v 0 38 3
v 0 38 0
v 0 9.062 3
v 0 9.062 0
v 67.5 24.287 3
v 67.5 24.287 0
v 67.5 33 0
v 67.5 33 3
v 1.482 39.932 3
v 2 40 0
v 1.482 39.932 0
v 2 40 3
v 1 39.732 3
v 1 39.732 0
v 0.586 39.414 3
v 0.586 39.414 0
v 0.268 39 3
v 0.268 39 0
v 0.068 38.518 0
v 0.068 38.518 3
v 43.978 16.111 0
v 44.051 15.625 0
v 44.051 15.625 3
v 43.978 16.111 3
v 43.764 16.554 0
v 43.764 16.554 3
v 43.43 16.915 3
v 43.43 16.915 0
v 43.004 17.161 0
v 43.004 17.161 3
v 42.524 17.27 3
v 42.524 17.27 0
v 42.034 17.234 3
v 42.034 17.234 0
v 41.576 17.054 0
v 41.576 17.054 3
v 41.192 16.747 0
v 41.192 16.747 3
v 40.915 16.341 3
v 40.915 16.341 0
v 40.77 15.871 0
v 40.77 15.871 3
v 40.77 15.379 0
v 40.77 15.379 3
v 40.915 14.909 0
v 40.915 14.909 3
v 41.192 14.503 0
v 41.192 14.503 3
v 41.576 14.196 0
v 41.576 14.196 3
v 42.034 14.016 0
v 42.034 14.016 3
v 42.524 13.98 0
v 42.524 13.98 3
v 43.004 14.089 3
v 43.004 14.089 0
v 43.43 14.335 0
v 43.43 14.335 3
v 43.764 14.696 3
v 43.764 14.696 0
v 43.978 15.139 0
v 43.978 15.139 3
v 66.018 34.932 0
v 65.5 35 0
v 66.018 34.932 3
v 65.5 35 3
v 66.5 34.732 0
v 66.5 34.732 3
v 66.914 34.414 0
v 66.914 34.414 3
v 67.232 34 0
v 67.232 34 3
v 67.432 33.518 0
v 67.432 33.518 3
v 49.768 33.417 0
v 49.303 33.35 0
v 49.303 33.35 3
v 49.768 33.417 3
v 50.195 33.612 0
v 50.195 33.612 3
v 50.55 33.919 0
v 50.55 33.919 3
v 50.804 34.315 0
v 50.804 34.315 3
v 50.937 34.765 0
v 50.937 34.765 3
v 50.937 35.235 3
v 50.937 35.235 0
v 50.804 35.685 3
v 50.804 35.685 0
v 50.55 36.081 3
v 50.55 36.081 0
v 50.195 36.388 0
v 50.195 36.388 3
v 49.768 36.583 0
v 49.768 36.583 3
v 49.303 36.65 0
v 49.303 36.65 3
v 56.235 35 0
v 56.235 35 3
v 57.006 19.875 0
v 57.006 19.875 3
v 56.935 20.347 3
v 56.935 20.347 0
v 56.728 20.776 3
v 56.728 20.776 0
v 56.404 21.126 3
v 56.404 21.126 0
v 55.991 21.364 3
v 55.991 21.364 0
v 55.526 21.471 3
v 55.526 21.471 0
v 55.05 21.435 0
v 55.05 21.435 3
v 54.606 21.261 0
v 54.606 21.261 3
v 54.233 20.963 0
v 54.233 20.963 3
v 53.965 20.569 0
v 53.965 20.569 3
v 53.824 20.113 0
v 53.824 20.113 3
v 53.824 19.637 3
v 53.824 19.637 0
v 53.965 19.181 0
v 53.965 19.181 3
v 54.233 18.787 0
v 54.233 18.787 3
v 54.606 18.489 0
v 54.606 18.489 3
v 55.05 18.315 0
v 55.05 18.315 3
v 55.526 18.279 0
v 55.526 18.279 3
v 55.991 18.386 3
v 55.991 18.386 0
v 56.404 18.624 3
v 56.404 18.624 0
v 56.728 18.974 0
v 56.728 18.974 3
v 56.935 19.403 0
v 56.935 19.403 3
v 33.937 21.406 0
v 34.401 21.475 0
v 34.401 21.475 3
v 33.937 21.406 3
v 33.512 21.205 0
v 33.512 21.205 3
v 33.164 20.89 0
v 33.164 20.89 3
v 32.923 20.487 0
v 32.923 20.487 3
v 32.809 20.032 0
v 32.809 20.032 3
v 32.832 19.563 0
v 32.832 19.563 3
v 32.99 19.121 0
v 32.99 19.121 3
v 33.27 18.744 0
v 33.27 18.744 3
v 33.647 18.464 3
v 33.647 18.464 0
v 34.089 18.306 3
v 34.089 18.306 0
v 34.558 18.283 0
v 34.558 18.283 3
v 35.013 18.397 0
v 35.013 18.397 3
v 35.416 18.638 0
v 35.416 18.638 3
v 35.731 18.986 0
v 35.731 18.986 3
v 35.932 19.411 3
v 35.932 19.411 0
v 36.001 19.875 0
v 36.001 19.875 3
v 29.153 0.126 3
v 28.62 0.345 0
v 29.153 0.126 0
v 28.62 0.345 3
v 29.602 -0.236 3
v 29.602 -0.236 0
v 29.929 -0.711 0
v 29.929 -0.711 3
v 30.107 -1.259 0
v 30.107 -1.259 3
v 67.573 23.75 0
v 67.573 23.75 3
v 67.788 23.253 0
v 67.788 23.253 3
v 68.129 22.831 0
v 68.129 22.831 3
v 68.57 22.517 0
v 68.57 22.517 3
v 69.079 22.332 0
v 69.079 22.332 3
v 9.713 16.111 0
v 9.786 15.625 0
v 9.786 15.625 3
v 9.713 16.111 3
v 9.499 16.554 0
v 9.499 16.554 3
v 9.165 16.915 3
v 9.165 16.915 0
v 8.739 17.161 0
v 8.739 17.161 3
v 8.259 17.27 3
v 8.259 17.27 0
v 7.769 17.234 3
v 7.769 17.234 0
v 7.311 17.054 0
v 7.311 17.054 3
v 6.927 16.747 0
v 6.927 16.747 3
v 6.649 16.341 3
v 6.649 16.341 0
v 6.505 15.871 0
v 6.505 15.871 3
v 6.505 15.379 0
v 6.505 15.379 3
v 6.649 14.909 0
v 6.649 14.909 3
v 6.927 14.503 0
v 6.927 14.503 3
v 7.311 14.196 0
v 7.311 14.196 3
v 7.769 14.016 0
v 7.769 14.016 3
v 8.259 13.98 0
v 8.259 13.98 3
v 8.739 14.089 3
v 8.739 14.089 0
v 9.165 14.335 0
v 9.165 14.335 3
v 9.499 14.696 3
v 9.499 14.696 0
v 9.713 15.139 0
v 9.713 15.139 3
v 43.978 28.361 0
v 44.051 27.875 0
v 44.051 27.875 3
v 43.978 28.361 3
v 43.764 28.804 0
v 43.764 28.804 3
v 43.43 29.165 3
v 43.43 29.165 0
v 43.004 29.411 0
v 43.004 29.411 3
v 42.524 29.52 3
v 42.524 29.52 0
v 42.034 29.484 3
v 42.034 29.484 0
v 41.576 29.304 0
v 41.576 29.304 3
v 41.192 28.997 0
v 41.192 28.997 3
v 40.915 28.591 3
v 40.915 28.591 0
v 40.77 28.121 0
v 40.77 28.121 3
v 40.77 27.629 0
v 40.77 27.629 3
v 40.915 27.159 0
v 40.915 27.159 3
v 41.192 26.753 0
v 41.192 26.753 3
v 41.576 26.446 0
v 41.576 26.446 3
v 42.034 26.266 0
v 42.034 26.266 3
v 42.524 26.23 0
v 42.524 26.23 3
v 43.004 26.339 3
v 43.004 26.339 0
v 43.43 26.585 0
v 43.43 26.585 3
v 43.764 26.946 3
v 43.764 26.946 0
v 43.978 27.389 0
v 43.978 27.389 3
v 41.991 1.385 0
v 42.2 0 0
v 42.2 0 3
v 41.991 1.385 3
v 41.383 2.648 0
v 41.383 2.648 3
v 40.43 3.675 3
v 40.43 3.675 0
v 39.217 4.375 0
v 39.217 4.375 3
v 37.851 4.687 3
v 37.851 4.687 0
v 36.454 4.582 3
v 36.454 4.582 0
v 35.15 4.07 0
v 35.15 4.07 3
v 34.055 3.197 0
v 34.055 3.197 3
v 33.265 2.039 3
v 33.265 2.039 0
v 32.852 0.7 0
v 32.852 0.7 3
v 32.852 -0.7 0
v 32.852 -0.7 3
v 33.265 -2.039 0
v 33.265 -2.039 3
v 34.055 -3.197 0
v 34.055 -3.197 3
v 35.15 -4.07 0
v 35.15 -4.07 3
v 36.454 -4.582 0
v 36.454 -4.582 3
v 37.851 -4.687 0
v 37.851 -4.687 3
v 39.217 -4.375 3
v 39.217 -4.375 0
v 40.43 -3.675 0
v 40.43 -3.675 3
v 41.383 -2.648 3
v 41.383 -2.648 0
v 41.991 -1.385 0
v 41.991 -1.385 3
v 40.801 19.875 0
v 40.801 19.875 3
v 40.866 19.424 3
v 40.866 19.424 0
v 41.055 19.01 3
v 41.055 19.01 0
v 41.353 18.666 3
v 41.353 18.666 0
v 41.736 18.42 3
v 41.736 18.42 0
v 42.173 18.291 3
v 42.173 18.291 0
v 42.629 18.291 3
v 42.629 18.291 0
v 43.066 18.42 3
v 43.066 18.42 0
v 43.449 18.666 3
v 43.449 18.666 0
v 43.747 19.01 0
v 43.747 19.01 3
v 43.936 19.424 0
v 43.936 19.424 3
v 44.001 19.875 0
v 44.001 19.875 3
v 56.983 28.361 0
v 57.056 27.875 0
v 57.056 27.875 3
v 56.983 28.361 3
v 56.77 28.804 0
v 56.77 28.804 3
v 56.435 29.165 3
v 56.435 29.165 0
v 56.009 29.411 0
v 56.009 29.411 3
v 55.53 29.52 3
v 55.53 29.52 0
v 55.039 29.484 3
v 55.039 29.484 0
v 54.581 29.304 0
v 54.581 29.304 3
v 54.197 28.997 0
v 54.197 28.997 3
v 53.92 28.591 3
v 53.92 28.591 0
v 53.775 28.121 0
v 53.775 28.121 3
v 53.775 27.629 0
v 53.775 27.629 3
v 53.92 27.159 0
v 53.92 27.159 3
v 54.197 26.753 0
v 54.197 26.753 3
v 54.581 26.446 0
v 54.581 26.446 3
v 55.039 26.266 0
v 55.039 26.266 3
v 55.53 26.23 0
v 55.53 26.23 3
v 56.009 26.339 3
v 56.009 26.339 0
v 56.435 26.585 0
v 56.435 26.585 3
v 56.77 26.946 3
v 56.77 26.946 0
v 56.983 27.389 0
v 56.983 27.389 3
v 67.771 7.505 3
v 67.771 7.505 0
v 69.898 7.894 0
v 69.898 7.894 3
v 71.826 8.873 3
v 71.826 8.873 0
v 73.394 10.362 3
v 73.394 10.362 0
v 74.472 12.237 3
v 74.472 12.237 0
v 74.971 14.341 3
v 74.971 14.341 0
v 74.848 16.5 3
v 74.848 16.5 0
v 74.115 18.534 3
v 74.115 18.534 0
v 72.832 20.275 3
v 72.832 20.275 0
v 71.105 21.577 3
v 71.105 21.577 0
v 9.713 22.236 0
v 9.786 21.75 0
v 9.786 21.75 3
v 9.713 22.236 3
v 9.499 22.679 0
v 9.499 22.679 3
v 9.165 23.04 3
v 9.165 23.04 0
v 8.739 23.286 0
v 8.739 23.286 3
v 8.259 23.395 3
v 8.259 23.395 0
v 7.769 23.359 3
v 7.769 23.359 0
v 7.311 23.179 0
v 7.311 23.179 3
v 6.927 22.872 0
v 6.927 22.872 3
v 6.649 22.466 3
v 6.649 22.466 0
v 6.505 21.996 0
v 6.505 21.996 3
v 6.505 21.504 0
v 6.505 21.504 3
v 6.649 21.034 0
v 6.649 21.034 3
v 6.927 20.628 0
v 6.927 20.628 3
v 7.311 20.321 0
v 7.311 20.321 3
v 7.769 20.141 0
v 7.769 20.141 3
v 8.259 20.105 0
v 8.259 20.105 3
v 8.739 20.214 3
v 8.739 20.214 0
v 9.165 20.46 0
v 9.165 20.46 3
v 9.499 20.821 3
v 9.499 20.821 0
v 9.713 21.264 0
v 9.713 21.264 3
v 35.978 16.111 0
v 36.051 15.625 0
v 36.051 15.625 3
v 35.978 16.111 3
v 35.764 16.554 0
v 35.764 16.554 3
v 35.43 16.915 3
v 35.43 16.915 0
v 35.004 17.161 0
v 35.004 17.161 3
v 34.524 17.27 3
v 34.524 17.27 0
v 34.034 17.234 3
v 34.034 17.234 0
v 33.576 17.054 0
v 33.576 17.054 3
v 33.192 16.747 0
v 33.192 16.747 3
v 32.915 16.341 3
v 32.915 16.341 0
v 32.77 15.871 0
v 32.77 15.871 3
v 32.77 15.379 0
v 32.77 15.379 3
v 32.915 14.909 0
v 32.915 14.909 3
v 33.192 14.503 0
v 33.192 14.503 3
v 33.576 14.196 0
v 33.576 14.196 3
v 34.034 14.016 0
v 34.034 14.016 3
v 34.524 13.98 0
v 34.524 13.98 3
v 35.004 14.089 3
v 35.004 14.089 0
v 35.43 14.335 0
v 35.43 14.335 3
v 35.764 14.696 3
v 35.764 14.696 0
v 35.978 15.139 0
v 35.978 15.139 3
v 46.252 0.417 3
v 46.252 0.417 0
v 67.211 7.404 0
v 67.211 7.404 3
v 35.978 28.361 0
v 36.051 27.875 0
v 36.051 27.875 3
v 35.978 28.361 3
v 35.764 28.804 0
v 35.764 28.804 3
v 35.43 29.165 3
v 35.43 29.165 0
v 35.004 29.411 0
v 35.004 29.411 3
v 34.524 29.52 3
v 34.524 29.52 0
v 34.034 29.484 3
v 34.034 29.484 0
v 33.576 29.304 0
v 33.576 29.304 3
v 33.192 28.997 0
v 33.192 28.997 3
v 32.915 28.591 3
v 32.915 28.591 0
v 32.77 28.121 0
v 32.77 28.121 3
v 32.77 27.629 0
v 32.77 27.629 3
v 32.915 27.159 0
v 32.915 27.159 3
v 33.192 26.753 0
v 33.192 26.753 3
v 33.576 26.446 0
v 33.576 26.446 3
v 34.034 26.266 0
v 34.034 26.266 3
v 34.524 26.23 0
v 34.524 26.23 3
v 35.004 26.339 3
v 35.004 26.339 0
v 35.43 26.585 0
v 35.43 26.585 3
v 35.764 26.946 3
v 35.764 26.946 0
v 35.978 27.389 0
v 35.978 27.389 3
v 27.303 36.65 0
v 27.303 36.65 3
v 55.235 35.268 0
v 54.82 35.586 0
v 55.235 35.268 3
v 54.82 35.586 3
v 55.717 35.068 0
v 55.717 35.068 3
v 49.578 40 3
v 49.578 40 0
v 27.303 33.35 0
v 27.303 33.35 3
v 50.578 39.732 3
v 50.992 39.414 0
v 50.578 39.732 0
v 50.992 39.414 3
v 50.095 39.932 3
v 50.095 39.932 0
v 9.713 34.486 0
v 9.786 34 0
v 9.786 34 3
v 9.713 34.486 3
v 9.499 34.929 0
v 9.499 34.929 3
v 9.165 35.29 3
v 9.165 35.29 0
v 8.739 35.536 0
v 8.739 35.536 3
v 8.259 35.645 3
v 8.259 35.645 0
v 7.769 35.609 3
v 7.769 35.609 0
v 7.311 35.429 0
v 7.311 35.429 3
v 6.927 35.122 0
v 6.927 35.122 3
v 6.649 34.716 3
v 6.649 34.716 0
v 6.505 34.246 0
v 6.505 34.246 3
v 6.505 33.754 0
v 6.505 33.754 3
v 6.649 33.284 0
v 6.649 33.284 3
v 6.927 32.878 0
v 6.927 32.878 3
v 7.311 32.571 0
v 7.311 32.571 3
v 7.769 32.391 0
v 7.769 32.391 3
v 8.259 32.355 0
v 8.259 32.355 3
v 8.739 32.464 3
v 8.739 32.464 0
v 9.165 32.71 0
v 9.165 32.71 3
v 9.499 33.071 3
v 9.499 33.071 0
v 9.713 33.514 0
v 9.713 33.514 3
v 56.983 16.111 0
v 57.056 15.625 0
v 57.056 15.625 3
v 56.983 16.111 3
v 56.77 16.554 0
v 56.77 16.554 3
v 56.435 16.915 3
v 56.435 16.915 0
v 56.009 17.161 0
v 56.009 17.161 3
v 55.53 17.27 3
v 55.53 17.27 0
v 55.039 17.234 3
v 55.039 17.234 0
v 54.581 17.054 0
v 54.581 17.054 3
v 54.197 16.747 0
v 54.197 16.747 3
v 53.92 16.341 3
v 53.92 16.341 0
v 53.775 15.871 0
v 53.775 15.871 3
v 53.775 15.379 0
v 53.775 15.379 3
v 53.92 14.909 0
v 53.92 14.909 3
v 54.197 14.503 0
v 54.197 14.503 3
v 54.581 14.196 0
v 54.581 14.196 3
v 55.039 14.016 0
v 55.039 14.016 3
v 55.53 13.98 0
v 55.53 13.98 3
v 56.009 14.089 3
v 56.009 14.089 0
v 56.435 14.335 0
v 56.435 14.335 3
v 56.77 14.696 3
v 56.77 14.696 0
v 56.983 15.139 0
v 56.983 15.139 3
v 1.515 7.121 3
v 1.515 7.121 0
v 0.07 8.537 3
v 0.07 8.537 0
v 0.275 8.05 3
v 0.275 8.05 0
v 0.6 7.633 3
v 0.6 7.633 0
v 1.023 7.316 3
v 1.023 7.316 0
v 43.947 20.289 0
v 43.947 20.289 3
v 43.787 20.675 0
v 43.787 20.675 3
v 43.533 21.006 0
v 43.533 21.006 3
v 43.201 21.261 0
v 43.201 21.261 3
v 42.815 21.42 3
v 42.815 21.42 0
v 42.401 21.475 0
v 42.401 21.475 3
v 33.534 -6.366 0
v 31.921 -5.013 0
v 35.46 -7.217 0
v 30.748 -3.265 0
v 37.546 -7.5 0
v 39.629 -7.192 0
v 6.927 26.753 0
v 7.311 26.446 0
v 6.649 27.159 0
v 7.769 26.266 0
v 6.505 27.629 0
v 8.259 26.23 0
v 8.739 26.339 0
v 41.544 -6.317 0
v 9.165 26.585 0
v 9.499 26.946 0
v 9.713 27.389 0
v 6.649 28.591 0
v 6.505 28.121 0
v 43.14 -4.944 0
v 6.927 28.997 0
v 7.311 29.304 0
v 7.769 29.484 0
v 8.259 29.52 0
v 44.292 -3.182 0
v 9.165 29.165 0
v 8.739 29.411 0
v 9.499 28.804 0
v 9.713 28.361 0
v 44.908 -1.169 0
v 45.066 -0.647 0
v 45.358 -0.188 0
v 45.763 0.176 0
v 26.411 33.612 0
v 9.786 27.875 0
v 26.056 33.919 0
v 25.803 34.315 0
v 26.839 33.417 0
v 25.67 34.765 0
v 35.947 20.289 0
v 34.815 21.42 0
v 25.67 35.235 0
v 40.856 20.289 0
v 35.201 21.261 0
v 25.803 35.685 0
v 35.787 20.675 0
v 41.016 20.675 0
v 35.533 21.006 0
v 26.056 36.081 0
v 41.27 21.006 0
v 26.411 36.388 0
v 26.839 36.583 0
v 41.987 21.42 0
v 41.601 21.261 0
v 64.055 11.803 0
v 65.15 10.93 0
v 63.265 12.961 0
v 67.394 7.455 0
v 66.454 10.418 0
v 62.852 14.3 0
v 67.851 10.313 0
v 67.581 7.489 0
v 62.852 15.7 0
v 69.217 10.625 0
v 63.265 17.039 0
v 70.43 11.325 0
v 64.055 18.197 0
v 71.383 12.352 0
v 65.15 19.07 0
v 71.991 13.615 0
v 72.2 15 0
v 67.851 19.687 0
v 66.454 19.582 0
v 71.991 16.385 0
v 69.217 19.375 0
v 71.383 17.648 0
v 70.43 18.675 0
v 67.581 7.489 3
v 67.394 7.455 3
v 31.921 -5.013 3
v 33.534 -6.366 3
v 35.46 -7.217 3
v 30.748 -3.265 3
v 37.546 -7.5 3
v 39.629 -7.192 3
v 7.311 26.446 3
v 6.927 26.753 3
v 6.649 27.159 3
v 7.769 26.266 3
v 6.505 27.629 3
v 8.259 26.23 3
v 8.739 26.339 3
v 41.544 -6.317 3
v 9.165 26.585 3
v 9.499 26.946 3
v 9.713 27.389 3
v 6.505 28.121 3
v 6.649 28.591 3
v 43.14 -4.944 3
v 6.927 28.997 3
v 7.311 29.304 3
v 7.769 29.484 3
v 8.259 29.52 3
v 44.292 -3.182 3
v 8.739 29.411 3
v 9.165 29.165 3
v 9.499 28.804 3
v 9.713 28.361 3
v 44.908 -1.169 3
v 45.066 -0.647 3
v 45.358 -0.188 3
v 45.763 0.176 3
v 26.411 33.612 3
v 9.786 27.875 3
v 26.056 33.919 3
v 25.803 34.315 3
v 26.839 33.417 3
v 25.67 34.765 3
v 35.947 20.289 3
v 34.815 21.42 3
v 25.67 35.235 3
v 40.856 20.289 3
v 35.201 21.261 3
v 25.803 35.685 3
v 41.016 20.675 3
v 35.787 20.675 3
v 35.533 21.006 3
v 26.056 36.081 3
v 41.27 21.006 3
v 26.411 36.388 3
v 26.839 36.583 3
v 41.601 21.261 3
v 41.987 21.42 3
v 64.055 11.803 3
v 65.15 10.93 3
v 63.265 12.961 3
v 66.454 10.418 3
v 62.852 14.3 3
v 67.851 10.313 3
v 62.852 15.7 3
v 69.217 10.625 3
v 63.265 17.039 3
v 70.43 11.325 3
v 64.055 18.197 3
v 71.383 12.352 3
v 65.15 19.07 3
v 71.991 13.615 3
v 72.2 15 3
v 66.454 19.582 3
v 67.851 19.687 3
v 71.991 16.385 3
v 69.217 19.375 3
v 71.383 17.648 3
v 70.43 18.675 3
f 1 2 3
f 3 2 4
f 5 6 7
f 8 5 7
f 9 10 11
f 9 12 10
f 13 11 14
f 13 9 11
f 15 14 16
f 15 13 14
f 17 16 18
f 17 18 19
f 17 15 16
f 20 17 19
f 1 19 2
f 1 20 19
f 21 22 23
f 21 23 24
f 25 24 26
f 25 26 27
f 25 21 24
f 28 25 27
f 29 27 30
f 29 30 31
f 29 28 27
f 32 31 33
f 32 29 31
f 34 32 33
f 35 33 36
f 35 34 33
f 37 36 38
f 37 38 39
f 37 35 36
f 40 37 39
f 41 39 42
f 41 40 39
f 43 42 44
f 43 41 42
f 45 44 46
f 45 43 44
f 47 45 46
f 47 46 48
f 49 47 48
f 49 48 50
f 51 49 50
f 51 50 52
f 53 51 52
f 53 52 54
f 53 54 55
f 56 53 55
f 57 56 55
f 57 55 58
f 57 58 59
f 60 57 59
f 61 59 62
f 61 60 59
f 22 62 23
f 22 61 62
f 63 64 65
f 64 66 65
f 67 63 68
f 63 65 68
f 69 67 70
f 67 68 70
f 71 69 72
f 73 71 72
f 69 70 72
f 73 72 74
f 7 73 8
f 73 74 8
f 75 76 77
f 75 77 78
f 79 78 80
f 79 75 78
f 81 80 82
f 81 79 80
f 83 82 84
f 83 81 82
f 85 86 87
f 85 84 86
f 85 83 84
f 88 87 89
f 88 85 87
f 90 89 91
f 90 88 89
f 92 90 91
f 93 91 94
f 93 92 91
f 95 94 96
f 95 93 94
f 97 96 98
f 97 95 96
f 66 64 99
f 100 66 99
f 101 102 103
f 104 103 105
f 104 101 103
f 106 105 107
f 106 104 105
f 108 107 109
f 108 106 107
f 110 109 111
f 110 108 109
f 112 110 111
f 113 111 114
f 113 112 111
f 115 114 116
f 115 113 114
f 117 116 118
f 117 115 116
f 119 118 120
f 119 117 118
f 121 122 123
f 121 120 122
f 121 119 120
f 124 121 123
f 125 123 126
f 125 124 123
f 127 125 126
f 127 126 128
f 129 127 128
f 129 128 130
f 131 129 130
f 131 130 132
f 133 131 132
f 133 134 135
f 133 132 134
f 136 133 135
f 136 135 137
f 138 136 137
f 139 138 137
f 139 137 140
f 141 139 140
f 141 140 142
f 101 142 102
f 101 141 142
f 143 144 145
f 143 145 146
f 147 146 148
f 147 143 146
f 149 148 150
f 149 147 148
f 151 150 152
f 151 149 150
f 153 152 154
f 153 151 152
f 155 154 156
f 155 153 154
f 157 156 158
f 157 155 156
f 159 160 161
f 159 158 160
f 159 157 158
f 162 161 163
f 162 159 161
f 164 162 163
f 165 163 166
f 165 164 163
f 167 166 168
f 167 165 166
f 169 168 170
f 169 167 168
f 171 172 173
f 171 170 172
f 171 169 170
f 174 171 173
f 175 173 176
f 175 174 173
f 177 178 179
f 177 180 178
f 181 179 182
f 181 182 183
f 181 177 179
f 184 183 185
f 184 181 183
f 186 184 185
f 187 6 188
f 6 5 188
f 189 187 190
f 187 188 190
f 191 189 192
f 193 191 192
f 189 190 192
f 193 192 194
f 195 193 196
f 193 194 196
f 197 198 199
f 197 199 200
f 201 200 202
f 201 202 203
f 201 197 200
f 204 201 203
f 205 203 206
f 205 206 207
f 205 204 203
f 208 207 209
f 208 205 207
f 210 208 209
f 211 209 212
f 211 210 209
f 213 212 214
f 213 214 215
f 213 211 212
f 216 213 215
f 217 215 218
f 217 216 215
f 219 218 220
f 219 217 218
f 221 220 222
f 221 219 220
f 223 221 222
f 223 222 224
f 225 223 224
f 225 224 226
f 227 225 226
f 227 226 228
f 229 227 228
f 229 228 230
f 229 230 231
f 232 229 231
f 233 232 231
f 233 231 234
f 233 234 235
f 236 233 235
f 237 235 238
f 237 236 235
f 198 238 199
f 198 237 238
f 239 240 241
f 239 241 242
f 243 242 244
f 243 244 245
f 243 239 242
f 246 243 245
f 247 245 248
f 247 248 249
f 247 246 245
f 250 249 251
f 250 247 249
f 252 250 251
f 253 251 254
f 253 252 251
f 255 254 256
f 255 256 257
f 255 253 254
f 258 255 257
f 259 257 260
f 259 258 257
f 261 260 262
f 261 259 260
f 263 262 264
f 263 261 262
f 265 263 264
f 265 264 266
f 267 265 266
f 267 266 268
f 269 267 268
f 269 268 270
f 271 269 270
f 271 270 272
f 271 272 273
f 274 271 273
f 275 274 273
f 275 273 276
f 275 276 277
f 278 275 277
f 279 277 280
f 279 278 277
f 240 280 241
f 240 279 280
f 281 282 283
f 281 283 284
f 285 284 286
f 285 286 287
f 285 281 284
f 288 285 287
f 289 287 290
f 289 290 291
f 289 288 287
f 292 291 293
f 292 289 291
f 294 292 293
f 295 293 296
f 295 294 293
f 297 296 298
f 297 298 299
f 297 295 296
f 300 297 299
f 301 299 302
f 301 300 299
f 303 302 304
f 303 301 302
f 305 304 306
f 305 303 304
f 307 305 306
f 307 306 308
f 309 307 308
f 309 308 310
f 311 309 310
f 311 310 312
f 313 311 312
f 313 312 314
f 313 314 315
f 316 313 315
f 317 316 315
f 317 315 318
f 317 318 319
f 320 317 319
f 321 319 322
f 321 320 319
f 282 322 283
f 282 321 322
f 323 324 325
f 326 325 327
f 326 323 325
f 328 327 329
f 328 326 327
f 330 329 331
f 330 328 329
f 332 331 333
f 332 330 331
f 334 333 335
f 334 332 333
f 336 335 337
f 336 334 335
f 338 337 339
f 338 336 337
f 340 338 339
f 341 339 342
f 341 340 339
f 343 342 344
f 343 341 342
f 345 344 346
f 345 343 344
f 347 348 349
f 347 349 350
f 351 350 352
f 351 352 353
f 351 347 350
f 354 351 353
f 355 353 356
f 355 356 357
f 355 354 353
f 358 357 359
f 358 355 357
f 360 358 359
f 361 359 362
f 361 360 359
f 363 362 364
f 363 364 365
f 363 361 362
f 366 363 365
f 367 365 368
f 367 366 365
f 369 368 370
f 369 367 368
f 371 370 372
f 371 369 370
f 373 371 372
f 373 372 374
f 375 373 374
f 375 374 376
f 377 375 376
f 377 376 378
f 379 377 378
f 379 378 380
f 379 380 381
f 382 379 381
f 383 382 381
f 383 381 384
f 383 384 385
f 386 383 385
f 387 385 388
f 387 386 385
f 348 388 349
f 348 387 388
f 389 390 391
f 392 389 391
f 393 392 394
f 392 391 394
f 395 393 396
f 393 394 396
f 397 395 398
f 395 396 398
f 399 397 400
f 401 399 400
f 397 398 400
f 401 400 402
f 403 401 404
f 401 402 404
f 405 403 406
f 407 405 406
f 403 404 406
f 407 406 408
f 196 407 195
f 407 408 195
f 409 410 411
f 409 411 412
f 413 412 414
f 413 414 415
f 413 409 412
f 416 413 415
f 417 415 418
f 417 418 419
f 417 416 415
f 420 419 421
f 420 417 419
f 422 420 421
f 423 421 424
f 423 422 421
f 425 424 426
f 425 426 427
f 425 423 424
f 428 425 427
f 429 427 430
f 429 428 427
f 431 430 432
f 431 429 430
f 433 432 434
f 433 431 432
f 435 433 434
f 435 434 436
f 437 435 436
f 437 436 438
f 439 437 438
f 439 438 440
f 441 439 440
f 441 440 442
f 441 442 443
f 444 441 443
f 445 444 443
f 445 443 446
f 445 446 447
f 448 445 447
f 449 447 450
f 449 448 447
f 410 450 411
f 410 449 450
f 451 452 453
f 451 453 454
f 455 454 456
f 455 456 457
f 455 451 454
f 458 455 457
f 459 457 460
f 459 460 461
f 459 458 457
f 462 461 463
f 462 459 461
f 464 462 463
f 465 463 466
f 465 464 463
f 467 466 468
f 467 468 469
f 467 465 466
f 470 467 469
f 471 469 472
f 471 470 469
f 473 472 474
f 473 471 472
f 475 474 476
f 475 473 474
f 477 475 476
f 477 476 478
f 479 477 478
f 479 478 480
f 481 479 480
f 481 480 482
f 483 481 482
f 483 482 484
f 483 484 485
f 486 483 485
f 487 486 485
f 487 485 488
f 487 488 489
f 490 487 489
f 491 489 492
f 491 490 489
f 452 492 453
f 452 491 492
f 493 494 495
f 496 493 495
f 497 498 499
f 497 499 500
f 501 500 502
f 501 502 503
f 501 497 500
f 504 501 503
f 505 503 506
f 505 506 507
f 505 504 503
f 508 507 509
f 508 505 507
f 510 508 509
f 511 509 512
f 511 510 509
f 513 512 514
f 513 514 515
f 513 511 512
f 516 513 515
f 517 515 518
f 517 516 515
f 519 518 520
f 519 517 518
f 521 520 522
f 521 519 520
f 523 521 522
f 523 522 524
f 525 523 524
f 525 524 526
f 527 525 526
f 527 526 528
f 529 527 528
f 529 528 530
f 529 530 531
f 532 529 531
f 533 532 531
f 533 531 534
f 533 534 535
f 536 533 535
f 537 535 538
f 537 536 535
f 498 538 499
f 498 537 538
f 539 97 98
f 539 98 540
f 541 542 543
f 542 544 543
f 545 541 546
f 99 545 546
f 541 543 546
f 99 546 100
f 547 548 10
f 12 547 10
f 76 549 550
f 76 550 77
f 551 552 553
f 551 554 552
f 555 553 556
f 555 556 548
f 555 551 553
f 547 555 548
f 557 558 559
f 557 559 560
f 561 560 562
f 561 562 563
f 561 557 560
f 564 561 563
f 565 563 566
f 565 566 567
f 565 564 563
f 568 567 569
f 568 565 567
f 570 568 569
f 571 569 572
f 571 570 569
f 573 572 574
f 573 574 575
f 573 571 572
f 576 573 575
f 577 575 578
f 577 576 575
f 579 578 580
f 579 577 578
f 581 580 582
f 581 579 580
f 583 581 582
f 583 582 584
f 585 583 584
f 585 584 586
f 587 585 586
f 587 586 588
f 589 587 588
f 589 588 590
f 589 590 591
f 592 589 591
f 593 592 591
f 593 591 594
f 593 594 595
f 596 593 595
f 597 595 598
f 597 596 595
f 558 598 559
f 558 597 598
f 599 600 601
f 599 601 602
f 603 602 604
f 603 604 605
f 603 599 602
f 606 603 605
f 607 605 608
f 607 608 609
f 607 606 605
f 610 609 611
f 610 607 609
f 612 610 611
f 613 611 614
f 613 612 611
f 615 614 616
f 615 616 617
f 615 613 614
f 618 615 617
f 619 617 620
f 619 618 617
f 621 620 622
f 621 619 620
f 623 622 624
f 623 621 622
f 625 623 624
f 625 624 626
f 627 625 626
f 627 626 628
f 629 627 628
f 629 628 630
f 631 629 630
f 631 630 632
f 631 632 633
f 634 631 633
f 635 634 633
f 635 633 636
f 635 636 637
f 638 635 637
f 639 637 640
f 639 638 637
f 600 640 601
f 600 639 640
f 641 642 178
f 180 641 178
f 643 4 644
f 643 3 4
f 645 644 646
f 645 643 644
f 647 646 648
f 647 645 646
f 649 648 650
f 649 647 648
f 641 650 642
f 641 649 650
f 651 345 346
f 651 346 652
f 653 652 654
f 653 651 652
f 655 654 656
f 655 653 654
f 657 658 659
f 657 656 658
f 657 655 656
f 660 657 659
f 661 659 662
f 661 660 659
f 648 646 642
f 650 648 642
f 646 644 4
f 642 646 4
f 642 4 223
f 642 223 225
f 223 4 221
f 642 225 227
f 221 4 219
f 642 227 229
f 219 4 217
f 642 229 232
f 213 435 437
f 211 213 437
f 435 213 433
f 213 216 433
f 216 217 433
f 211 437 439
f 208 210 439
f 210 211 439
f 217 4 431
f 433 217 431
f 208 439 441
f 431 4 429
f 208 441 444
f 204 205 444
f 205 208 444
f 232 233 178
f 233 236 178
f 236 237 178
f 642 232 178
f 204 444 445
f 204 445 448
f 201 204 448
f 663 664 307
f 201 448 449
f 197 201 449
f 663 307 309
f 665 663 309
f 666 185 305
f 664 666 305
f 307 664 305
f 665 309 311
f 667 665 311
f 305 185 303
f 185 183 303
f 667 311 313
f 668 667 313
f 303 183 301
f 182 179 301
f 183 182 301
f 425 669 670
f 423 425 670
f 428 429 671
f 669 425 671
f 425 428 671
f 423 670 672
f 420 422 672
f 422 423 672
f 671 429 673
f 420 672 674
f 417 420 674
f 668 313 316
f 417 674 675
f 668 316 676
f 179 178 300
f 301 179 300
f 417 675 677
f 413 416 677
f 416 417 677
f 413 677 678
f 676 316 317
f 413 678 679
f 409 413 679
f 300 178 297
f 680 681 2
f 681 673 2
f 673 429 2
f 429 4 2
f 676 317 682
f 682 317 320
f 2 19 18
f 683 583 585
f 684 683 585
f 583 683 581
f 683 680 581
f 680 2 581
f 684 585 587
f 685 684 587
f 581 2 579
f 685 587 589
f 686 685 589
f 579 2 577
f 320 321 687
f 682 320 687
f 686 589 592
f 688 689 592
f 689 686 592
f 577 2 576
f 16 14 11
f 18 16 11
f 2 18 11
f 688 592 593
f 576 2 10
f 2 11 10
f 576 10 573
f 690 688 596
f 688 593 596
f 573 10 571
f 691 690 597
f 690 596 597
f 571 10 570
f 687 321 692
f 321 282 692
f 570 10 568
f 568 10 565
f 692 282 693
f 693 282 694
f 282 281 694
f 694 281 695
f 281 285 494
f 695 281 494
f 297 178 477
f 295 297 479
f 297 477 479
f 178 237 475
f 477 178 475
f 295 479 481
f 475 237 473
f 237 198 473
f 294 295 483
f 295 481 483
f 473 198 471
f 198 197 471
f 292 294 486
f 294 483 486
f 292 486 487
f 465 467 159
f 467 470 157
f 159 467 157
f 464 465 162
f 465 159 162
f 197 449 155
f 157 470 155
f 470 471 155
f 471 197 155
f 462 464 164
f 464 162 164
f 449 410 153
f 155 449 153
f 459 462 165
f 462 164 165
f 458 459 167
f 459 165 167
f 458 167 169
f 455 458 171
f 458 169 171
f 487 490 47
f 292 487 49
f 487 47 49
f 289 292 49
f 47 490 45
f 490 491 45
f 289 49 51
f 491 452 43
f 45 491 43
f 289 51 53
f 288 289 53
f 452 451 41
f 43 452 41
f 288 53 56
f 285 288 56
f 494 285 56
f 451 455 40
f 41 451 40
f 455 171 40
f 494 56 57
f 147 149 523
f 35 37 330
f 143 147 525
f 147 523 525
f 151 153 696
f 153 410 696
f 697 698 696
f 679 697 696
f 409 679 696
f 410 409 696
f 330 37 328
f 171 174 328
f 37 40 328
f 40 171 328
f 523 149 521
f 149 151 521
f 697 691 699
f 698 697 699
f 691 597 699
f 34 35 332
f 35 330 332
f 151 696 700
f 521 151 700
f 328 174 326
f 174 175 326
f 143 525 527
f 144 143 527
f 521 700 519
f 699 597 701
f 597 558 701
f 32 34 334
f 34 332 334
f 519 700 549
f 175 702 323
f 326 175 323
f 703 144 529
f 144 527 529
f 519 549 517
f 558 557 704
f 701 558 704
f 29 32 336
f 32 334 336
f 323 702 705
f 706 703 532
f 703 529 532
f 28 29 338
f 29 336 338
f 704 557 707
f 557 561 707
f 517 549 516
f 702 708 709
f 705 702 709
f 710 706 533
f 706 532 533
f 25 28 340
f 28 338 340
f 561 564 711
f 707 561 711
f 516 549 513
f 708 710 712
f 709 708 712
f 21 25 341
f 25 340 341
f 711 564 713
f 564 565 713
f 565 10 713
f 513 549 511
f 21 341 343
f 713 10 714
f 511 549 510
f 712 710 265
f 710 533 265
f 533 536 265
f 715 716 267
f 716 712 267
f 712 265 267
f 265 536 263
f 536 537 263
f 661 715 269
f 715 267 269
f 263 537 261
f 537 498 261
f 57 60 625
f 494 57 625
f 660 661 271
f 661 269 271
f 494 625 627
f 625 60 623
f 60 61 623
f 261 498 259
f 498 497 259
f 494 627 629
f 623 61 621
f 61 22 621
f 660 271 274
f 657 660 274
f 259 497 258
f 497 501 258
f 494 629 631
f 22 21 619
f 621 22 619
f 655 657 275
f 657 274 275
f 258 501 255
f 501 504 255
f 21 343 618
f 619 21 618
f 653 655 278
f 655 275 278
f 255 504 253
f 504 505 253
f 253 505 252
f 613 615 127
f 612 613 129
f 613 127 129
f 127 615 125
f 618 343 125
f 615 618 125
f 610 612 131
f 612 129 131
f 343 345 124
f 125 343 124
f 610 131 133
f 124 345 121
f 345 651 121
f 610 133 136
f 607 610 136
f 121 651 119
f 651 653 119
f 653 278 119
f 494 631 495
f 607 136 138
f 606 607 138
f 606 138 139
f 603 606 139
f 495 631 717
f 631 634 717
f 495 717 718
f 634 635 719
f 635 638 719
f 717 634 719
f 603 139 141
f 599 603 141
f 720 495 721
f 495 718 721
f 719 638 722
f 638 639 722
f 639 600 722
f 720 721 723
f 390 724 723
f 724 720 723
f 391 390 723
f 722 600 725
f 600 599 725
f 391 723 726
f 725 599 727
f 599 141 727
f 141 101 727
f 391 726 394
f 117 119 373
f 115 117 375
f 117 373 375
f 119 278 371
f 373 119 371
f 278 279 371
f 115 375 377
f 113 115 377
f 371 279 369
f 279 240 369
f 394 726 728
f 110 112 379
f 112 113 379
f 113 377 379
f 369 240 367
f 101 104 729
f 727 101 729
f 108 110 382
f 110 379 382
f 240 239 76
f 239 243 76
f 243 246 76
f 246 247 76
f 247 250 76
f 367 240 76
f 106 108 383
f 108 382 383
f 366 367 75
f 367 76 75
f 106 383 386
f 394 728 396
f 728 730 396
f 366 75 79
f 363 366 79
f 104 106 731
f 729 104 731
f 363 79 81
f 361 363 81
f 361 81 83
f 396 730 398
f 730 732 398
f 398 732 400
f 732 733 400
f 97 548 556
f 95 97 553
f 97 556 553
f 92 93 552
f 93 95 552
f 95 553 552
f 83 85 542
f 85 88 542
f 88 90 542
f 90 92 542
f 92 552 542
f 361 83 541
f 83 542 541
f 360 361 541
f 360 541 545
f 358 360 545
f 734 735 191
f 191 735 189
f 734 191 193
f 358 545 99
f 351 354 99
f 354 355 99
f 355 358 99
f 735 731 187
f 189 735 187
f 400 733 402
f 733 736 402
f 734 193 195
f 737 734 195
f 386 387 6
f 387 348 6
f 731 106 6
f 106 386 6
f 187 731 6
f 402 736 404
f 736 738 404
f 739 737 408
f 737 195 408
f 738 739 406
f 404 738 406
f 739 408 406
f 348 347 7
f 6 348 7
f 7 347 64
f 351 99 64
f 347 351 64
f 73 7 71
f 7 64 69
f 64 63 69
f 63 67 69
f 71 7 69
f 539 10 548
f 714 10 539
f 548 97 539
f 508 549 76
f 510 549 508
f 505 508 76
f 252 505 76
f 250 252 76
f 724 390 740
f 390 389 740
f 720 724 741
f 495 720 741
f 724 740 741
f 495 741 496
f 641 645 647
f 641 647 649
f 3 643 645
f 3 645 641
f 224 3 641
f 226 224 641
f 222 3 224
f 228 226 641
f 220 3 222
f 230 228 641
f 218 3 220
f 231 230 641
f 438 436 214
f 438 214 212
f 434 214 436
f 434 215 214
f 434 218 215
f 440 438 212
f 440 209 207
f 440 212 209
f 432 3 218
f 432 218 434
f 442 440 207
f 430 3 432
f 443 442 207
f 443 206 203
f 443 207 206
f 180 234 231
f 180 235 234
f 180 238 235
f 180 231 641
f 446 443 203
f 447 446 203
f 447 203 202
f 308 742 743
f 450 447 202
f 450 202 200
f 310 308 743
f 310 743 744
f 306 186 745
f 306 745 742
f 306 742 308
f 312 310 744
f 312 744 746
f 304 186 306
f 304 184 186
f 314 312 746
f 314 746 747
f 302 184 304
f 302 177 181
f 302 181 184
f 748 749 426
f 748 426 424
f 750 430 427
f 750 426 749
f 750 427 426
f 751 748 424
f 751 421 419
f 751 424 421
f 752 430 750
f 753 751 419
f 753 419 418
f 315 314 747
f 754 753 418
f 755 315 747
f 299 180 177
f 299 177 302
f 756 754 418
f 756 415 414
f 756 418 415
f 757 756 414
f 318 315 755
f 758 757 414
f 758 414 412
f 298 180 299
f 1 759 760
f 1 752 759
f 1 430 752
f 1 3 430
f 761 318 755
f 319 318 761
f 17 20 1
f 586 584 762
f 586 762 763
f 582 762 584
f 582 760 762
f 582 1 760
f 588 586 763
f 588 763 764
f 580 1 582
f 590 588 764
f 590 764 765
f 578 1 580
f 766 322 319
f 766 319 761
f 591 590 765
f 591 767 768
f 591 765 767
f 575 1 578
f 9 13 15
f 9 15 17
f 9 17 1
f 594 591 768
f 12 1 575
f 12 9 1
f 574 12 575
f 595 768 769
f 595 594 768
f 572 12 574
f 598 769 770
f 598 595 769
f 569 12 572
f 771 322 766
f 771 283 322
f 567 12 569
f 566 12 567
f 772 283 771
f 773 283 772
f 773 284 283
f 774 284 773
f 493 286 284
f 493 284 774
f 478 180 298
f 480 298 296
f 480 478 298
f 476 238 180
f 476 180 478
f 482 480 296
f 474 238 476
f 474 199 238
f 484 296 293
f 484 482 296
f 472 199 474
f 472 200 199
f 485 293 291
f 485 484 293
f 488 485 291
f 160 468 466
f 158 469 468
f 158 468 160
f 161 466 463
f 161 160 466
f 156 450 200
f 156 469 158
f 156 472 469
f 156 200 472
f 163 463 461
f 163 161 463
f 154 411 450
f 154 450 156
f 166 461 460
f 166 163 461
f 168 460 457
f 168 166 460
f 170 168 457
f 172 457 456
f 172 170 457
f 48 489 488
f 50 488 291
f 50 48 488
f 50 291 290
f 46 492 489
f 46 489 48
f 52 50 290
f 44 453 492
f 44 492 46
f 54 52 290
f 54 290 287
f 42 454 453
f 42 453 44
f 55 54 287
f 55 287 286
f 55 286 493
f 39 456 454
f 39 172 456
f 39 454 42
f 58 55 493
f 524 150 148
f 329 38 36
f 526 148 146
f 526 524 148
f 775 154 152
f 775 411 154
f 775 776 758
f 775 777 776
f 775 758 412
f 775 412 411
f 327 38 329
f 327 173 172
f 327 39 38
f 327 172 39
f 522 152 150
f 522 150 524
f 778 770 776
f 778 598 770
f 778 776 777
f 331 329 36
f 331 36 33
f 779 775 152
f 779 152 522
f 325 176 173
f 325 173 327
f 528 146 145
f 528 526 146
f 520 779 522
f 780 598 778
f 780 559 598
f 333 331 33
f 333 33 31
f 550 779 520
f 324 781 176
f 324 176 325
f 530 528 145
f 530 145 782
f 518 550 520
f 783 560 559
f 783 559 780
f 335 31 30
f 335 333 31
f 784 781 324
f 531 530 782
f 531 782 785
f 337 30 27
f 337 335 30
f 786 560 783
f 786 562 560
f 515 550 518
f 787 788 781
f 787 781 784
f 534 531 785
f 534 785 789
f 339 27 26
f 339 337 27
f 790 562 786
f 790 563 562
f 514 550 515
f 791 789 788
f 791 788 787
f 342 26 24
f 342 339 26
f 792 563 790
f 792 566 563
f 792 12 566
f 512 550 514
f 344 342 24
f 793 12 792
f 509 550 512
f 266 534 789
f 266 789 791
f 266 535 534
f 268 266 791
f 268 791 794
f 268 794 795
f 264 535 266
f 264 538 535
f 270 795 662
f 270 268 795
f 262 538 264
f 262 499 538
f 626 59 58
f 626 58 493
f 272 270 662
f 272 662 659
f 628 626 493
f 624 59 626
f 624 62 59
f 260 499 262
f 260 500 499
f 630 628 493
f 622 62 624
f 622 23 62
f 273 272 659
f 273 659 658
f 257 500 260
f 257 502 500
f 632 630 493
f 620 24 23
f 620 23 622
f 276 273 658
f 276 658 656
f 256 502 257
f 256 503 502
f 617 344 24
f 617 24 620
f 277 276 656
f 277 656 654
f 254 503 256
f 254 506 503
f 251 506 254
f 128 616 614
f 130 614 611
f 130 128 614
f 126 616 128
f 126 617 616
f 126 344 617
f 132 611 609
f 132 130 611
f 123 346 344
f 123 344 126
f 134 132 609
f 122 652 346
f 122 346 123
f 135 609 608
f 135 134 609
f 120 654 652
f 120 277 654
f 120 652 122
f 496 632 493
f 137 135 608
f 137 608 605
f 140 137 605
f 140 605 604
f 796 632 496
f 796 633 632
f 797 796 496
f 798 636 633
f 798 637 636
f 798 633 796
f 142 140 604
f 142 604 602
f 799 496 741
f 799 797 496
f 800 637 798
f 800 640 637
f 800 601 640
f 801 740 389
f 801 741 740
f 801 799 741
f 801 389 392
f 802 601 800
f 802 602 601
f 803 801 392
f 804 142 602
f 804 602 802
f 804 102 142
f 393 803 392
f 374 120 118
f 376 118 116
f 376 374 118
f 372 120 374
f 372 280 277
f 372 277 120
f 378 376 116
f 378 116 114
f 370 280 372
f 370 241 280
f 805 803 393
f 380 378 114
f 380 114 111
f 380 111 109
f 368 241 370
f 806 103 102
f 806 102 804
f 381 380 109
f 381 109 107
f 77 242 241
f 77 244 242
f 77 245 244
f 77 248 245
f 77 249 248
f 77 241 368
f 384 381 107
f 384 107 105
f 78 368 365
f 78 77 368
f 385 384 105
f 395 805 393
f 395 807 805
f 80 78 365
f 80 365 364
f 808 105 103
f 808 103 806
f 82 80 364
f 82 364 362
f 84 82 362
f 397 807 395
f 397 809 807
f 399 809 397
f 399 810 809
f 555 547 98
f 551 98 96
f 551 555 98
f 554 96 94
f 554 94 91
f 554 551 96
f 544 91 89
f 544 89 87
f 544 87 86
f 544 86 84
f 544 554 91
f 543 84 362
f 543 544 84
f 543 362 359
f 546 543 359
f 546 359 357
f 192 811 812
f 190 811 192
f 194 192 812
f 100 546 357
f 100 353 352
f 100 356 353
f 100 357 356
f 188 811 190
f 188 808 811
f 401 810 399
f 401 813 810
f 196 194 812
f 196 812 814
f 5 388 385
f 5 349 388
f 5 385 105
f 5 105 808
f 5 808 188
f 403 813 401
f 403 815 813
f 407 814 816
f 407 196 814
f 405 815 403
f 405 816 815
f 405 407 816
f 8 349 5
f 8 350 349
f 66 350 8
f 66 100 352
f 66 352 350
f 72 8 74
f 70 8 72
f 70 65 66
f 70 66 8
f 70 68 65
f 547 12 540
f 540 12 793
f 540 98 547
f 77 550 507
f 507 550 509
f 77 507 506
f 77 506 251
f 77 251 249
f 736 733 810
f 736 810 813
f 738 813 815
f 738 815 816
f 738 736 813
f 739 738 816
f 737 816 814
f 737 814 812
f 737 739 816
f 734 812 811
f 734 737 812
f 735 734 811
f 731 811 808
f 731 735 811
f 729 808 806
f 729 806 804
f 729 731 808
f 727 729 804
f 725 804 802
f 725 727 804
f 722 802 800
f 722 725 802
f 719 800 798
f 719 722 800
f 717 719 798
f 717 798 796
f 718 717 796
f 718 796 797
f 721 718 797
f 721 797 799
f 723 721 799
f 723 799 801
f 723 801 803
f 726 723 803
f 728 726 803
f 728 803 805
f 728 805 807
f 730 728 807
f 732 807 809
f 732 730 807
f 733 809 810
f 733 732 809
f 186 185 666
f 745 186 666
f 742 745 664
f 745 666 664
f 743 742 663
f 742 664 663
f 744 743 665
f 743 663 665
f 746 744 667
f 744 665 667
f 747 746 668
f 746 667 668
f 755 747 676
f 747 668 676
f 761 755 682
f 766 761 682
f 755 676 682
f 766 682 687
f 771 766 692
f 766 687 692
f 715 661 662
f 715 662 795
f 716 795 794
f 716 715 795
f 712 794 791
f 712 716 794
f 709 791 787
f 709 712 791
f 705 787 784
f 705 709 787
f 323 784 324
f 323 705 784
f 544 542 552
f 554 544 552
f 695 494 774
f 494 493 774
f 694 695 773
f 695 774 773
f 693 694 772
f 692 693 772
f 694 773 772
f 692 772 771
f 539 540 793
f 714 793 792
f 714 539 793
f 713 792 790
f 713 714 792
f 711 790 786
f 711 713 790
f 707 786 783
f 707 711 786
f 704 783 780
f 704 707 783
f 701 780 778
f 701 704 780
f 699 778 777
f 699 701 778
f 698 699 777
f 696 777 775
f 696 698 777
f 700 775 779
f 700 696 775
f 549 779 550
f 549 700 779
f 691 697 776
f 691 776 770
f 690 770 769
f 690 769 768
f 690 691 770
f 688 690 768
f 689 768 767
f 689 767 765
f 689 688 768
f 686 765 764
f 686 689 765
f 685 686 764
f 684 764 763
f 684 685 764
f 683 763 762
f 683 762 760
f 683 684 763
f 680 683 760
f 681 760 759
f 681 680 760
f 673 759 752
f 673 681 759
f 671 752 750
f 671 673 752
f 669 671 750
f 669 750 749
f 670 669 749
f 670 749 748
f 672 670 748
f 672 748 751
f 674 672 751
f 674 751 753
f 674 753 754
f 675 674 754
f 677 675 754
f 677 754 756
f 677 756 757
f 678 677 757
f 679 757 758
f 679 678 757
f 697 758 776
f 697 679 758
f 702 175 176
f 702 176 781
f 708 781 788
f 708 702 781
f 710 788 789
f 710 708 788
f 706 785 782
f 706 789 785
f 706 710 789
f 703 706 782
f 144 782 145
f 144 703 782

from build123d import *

# Parameters (mm, degrees)
SKETCH_1_R          = 1.65
SKETCH_1_R_2        = 4.7
EXTRUDE_1_DEPTH     = 3
FILLET_4_R          = 2
CUT_EXTRUDE_2_DEPTH = 10
SKETCH_3_R          = 1.6
CUT_EXTRUDE_4_DEPTH = 10


with BuildPart() as part:
    # 草图1 → 凸台-拉伸1 (new body)
    with BuildSketch(Plane.XY):
        with BuildLine():
            Line((55.40625, 35), (50.40625, 40))
            Line((50.40625, 40), (0, 40))
            Line((0, 40), (0, 7.5))
            Line((0, 7.5), (30, 0))
            ThreePointArc((30, 0), (37.5, -7.5), (45, 0))
            Line((45, 0), (67.5, 7.5))
            ThreePointArc((67.5, 7.5), (75, 15), (67.5, 22.5))
            Line((67.5, 22.5), (67.5, 35))
            Line((67.5, 35), (55.40625, 35))
        make_face()
        with Locations((8.136085868, 34)):
            Circle(SKETCH_1_R, mode=Mode.SUBTRACT)
        with Locations((42.401142919, 27.875)):
            Circle(SKETCH_1_R, mode=Mode.SUBTRACT)
        with Locations((34.401142919, 27.875)):
            Circle(SKETCH_1_R, mode=Mode.SUBTRACT)
        with Locations((55.40625, 27.875)):
            Circle(SKETCH_1_R, mode=Mode.SUBTRACT)
        with Locations((8.136085868, 15.625)):
            Circle(SKETCH_1_R, mode=Mode.SUBTRACT)
        with Locations((34.401142919, 15.625)):
            Circle(SKETCH_1_R, mode=Mode.SUBTRACT)
        with Locations((42.401142919, 15.625)):
            Circle(SKETCH_1_R, mode=Mode.SUBTRACT)
        with Locations((55.40625, 15.625)):
            Circle(SKETCH_1_R, mode=Mode.SUBTRACT)
        with Locations((8.136085868, 21.75)):
            Circle(SKETCH_1_R, mode=Mode.SUBTRACT)
        with Locations((8.136085868, 27.875)):
            Circle(SKETCH_1_R, mode=Mode.SUBTRACT)
        with Locations((37.5, 0)):
            Circle(SKETCH_1_R_2, mode=Mode.SUBTRACT)
        with Locations((67.5, 15)):
            Circle(SKETCH_1_R_2, mode=Mode.SUBTRACT)
    extrude(amount=EXTRUDE_1_DEPTH)

    # 圆角4
    fillet_4_edges = [part.edges().sort_by_distance(p)[0] for p in [
        (55.40625, 35, 1.5),
        (67.5, 35, 1.5),
        (67.5, 22.5, 1.5),
        (67.5, 7.5, 1.5),
        (45, 0, 1.5),
        (30, 0, 1.5),
        (0, 7.5, 1.5),
        (0, 40, 1.5),
        (50.40625, 40, 1.5),
    ]]
    fillet(fillet_4_edges, radius=FILLET_4_R)

    # 草图2 → 切除-拉伸2 (cut)
    with BuildSketch(Plane.XY):
        with BuildLine():
            Line((49.30341073, 36.65), (27.30341073, 36.65))
            ThreePointArc((27.30341073, 36.65), (25.65341073, 35), (27.30341073, 33.35))
            Line((27.30341073, 33.35), (49.30341073, 33.35))
            ThreePointArc((49.30341073, 33.35), (50.95341073, 35), (49.30341073, 36.65))
        make_face()
    extrude(amount=CUT_EXTRUDE_2_DEPTH, mode=Mode.SUBTRACT)

    # 草图3 → 切除-拉伸4 (cut)
    with BuildSketch(Plane.XY):
        with BuildLine():
            ThreePointArc((36.001142919, 19.875), (35.532513769, 21.00637085), (34.401142919, 21.475))
            Line((34.401142919, 21.475), (34.401142919, 19.875))
            Line((34.401142919, 19.875), (36.001142919, 19.875))
        make_face()
        with BuildLine():
            Line((34.401142919, 19.875), (34.401142919, 21.475))
            ThreePointArc((34.401142919, 21.475), (33.269772069, 18.74362915), (36.001142919, 19.875))
            Line((36.001142919, 19.875), (34.401142919, 19.875))
        make_face()
        with BuildLine():
            ThreePointArc((44.001142919, 19.875), (43.532513769, 21.00637085), (42.401142919, 21.475))
            Line((42.401142919, 21.475), (42.401142919, 19.875))
            Line((42.401142919, 19.875), (40.801142919, 19.875))
            ThreePointArc((40.801142919, 19.875), (42.401142919, 18.275), (44.001142919, 19.875))
        make_face()
        with BuildLine():
            Line((42.401142919, 19.875), (42.401142919, 21.475))
            ThreePointArc((42.401142919, 21.475), (41.269772069, 21.00637085), (40.801142919, 19.875))
            Line((40.801142919, 19.875), (42.401142919, 19.875))
        make_face()
        with Locations((55.40625, 19.875)):
            Circle(SKETCH_3_R)
    extrude(amount=CUT_EXTRUDE_4_DEPTH, mode=Mode.SUBTRACT)


solid = part.part
